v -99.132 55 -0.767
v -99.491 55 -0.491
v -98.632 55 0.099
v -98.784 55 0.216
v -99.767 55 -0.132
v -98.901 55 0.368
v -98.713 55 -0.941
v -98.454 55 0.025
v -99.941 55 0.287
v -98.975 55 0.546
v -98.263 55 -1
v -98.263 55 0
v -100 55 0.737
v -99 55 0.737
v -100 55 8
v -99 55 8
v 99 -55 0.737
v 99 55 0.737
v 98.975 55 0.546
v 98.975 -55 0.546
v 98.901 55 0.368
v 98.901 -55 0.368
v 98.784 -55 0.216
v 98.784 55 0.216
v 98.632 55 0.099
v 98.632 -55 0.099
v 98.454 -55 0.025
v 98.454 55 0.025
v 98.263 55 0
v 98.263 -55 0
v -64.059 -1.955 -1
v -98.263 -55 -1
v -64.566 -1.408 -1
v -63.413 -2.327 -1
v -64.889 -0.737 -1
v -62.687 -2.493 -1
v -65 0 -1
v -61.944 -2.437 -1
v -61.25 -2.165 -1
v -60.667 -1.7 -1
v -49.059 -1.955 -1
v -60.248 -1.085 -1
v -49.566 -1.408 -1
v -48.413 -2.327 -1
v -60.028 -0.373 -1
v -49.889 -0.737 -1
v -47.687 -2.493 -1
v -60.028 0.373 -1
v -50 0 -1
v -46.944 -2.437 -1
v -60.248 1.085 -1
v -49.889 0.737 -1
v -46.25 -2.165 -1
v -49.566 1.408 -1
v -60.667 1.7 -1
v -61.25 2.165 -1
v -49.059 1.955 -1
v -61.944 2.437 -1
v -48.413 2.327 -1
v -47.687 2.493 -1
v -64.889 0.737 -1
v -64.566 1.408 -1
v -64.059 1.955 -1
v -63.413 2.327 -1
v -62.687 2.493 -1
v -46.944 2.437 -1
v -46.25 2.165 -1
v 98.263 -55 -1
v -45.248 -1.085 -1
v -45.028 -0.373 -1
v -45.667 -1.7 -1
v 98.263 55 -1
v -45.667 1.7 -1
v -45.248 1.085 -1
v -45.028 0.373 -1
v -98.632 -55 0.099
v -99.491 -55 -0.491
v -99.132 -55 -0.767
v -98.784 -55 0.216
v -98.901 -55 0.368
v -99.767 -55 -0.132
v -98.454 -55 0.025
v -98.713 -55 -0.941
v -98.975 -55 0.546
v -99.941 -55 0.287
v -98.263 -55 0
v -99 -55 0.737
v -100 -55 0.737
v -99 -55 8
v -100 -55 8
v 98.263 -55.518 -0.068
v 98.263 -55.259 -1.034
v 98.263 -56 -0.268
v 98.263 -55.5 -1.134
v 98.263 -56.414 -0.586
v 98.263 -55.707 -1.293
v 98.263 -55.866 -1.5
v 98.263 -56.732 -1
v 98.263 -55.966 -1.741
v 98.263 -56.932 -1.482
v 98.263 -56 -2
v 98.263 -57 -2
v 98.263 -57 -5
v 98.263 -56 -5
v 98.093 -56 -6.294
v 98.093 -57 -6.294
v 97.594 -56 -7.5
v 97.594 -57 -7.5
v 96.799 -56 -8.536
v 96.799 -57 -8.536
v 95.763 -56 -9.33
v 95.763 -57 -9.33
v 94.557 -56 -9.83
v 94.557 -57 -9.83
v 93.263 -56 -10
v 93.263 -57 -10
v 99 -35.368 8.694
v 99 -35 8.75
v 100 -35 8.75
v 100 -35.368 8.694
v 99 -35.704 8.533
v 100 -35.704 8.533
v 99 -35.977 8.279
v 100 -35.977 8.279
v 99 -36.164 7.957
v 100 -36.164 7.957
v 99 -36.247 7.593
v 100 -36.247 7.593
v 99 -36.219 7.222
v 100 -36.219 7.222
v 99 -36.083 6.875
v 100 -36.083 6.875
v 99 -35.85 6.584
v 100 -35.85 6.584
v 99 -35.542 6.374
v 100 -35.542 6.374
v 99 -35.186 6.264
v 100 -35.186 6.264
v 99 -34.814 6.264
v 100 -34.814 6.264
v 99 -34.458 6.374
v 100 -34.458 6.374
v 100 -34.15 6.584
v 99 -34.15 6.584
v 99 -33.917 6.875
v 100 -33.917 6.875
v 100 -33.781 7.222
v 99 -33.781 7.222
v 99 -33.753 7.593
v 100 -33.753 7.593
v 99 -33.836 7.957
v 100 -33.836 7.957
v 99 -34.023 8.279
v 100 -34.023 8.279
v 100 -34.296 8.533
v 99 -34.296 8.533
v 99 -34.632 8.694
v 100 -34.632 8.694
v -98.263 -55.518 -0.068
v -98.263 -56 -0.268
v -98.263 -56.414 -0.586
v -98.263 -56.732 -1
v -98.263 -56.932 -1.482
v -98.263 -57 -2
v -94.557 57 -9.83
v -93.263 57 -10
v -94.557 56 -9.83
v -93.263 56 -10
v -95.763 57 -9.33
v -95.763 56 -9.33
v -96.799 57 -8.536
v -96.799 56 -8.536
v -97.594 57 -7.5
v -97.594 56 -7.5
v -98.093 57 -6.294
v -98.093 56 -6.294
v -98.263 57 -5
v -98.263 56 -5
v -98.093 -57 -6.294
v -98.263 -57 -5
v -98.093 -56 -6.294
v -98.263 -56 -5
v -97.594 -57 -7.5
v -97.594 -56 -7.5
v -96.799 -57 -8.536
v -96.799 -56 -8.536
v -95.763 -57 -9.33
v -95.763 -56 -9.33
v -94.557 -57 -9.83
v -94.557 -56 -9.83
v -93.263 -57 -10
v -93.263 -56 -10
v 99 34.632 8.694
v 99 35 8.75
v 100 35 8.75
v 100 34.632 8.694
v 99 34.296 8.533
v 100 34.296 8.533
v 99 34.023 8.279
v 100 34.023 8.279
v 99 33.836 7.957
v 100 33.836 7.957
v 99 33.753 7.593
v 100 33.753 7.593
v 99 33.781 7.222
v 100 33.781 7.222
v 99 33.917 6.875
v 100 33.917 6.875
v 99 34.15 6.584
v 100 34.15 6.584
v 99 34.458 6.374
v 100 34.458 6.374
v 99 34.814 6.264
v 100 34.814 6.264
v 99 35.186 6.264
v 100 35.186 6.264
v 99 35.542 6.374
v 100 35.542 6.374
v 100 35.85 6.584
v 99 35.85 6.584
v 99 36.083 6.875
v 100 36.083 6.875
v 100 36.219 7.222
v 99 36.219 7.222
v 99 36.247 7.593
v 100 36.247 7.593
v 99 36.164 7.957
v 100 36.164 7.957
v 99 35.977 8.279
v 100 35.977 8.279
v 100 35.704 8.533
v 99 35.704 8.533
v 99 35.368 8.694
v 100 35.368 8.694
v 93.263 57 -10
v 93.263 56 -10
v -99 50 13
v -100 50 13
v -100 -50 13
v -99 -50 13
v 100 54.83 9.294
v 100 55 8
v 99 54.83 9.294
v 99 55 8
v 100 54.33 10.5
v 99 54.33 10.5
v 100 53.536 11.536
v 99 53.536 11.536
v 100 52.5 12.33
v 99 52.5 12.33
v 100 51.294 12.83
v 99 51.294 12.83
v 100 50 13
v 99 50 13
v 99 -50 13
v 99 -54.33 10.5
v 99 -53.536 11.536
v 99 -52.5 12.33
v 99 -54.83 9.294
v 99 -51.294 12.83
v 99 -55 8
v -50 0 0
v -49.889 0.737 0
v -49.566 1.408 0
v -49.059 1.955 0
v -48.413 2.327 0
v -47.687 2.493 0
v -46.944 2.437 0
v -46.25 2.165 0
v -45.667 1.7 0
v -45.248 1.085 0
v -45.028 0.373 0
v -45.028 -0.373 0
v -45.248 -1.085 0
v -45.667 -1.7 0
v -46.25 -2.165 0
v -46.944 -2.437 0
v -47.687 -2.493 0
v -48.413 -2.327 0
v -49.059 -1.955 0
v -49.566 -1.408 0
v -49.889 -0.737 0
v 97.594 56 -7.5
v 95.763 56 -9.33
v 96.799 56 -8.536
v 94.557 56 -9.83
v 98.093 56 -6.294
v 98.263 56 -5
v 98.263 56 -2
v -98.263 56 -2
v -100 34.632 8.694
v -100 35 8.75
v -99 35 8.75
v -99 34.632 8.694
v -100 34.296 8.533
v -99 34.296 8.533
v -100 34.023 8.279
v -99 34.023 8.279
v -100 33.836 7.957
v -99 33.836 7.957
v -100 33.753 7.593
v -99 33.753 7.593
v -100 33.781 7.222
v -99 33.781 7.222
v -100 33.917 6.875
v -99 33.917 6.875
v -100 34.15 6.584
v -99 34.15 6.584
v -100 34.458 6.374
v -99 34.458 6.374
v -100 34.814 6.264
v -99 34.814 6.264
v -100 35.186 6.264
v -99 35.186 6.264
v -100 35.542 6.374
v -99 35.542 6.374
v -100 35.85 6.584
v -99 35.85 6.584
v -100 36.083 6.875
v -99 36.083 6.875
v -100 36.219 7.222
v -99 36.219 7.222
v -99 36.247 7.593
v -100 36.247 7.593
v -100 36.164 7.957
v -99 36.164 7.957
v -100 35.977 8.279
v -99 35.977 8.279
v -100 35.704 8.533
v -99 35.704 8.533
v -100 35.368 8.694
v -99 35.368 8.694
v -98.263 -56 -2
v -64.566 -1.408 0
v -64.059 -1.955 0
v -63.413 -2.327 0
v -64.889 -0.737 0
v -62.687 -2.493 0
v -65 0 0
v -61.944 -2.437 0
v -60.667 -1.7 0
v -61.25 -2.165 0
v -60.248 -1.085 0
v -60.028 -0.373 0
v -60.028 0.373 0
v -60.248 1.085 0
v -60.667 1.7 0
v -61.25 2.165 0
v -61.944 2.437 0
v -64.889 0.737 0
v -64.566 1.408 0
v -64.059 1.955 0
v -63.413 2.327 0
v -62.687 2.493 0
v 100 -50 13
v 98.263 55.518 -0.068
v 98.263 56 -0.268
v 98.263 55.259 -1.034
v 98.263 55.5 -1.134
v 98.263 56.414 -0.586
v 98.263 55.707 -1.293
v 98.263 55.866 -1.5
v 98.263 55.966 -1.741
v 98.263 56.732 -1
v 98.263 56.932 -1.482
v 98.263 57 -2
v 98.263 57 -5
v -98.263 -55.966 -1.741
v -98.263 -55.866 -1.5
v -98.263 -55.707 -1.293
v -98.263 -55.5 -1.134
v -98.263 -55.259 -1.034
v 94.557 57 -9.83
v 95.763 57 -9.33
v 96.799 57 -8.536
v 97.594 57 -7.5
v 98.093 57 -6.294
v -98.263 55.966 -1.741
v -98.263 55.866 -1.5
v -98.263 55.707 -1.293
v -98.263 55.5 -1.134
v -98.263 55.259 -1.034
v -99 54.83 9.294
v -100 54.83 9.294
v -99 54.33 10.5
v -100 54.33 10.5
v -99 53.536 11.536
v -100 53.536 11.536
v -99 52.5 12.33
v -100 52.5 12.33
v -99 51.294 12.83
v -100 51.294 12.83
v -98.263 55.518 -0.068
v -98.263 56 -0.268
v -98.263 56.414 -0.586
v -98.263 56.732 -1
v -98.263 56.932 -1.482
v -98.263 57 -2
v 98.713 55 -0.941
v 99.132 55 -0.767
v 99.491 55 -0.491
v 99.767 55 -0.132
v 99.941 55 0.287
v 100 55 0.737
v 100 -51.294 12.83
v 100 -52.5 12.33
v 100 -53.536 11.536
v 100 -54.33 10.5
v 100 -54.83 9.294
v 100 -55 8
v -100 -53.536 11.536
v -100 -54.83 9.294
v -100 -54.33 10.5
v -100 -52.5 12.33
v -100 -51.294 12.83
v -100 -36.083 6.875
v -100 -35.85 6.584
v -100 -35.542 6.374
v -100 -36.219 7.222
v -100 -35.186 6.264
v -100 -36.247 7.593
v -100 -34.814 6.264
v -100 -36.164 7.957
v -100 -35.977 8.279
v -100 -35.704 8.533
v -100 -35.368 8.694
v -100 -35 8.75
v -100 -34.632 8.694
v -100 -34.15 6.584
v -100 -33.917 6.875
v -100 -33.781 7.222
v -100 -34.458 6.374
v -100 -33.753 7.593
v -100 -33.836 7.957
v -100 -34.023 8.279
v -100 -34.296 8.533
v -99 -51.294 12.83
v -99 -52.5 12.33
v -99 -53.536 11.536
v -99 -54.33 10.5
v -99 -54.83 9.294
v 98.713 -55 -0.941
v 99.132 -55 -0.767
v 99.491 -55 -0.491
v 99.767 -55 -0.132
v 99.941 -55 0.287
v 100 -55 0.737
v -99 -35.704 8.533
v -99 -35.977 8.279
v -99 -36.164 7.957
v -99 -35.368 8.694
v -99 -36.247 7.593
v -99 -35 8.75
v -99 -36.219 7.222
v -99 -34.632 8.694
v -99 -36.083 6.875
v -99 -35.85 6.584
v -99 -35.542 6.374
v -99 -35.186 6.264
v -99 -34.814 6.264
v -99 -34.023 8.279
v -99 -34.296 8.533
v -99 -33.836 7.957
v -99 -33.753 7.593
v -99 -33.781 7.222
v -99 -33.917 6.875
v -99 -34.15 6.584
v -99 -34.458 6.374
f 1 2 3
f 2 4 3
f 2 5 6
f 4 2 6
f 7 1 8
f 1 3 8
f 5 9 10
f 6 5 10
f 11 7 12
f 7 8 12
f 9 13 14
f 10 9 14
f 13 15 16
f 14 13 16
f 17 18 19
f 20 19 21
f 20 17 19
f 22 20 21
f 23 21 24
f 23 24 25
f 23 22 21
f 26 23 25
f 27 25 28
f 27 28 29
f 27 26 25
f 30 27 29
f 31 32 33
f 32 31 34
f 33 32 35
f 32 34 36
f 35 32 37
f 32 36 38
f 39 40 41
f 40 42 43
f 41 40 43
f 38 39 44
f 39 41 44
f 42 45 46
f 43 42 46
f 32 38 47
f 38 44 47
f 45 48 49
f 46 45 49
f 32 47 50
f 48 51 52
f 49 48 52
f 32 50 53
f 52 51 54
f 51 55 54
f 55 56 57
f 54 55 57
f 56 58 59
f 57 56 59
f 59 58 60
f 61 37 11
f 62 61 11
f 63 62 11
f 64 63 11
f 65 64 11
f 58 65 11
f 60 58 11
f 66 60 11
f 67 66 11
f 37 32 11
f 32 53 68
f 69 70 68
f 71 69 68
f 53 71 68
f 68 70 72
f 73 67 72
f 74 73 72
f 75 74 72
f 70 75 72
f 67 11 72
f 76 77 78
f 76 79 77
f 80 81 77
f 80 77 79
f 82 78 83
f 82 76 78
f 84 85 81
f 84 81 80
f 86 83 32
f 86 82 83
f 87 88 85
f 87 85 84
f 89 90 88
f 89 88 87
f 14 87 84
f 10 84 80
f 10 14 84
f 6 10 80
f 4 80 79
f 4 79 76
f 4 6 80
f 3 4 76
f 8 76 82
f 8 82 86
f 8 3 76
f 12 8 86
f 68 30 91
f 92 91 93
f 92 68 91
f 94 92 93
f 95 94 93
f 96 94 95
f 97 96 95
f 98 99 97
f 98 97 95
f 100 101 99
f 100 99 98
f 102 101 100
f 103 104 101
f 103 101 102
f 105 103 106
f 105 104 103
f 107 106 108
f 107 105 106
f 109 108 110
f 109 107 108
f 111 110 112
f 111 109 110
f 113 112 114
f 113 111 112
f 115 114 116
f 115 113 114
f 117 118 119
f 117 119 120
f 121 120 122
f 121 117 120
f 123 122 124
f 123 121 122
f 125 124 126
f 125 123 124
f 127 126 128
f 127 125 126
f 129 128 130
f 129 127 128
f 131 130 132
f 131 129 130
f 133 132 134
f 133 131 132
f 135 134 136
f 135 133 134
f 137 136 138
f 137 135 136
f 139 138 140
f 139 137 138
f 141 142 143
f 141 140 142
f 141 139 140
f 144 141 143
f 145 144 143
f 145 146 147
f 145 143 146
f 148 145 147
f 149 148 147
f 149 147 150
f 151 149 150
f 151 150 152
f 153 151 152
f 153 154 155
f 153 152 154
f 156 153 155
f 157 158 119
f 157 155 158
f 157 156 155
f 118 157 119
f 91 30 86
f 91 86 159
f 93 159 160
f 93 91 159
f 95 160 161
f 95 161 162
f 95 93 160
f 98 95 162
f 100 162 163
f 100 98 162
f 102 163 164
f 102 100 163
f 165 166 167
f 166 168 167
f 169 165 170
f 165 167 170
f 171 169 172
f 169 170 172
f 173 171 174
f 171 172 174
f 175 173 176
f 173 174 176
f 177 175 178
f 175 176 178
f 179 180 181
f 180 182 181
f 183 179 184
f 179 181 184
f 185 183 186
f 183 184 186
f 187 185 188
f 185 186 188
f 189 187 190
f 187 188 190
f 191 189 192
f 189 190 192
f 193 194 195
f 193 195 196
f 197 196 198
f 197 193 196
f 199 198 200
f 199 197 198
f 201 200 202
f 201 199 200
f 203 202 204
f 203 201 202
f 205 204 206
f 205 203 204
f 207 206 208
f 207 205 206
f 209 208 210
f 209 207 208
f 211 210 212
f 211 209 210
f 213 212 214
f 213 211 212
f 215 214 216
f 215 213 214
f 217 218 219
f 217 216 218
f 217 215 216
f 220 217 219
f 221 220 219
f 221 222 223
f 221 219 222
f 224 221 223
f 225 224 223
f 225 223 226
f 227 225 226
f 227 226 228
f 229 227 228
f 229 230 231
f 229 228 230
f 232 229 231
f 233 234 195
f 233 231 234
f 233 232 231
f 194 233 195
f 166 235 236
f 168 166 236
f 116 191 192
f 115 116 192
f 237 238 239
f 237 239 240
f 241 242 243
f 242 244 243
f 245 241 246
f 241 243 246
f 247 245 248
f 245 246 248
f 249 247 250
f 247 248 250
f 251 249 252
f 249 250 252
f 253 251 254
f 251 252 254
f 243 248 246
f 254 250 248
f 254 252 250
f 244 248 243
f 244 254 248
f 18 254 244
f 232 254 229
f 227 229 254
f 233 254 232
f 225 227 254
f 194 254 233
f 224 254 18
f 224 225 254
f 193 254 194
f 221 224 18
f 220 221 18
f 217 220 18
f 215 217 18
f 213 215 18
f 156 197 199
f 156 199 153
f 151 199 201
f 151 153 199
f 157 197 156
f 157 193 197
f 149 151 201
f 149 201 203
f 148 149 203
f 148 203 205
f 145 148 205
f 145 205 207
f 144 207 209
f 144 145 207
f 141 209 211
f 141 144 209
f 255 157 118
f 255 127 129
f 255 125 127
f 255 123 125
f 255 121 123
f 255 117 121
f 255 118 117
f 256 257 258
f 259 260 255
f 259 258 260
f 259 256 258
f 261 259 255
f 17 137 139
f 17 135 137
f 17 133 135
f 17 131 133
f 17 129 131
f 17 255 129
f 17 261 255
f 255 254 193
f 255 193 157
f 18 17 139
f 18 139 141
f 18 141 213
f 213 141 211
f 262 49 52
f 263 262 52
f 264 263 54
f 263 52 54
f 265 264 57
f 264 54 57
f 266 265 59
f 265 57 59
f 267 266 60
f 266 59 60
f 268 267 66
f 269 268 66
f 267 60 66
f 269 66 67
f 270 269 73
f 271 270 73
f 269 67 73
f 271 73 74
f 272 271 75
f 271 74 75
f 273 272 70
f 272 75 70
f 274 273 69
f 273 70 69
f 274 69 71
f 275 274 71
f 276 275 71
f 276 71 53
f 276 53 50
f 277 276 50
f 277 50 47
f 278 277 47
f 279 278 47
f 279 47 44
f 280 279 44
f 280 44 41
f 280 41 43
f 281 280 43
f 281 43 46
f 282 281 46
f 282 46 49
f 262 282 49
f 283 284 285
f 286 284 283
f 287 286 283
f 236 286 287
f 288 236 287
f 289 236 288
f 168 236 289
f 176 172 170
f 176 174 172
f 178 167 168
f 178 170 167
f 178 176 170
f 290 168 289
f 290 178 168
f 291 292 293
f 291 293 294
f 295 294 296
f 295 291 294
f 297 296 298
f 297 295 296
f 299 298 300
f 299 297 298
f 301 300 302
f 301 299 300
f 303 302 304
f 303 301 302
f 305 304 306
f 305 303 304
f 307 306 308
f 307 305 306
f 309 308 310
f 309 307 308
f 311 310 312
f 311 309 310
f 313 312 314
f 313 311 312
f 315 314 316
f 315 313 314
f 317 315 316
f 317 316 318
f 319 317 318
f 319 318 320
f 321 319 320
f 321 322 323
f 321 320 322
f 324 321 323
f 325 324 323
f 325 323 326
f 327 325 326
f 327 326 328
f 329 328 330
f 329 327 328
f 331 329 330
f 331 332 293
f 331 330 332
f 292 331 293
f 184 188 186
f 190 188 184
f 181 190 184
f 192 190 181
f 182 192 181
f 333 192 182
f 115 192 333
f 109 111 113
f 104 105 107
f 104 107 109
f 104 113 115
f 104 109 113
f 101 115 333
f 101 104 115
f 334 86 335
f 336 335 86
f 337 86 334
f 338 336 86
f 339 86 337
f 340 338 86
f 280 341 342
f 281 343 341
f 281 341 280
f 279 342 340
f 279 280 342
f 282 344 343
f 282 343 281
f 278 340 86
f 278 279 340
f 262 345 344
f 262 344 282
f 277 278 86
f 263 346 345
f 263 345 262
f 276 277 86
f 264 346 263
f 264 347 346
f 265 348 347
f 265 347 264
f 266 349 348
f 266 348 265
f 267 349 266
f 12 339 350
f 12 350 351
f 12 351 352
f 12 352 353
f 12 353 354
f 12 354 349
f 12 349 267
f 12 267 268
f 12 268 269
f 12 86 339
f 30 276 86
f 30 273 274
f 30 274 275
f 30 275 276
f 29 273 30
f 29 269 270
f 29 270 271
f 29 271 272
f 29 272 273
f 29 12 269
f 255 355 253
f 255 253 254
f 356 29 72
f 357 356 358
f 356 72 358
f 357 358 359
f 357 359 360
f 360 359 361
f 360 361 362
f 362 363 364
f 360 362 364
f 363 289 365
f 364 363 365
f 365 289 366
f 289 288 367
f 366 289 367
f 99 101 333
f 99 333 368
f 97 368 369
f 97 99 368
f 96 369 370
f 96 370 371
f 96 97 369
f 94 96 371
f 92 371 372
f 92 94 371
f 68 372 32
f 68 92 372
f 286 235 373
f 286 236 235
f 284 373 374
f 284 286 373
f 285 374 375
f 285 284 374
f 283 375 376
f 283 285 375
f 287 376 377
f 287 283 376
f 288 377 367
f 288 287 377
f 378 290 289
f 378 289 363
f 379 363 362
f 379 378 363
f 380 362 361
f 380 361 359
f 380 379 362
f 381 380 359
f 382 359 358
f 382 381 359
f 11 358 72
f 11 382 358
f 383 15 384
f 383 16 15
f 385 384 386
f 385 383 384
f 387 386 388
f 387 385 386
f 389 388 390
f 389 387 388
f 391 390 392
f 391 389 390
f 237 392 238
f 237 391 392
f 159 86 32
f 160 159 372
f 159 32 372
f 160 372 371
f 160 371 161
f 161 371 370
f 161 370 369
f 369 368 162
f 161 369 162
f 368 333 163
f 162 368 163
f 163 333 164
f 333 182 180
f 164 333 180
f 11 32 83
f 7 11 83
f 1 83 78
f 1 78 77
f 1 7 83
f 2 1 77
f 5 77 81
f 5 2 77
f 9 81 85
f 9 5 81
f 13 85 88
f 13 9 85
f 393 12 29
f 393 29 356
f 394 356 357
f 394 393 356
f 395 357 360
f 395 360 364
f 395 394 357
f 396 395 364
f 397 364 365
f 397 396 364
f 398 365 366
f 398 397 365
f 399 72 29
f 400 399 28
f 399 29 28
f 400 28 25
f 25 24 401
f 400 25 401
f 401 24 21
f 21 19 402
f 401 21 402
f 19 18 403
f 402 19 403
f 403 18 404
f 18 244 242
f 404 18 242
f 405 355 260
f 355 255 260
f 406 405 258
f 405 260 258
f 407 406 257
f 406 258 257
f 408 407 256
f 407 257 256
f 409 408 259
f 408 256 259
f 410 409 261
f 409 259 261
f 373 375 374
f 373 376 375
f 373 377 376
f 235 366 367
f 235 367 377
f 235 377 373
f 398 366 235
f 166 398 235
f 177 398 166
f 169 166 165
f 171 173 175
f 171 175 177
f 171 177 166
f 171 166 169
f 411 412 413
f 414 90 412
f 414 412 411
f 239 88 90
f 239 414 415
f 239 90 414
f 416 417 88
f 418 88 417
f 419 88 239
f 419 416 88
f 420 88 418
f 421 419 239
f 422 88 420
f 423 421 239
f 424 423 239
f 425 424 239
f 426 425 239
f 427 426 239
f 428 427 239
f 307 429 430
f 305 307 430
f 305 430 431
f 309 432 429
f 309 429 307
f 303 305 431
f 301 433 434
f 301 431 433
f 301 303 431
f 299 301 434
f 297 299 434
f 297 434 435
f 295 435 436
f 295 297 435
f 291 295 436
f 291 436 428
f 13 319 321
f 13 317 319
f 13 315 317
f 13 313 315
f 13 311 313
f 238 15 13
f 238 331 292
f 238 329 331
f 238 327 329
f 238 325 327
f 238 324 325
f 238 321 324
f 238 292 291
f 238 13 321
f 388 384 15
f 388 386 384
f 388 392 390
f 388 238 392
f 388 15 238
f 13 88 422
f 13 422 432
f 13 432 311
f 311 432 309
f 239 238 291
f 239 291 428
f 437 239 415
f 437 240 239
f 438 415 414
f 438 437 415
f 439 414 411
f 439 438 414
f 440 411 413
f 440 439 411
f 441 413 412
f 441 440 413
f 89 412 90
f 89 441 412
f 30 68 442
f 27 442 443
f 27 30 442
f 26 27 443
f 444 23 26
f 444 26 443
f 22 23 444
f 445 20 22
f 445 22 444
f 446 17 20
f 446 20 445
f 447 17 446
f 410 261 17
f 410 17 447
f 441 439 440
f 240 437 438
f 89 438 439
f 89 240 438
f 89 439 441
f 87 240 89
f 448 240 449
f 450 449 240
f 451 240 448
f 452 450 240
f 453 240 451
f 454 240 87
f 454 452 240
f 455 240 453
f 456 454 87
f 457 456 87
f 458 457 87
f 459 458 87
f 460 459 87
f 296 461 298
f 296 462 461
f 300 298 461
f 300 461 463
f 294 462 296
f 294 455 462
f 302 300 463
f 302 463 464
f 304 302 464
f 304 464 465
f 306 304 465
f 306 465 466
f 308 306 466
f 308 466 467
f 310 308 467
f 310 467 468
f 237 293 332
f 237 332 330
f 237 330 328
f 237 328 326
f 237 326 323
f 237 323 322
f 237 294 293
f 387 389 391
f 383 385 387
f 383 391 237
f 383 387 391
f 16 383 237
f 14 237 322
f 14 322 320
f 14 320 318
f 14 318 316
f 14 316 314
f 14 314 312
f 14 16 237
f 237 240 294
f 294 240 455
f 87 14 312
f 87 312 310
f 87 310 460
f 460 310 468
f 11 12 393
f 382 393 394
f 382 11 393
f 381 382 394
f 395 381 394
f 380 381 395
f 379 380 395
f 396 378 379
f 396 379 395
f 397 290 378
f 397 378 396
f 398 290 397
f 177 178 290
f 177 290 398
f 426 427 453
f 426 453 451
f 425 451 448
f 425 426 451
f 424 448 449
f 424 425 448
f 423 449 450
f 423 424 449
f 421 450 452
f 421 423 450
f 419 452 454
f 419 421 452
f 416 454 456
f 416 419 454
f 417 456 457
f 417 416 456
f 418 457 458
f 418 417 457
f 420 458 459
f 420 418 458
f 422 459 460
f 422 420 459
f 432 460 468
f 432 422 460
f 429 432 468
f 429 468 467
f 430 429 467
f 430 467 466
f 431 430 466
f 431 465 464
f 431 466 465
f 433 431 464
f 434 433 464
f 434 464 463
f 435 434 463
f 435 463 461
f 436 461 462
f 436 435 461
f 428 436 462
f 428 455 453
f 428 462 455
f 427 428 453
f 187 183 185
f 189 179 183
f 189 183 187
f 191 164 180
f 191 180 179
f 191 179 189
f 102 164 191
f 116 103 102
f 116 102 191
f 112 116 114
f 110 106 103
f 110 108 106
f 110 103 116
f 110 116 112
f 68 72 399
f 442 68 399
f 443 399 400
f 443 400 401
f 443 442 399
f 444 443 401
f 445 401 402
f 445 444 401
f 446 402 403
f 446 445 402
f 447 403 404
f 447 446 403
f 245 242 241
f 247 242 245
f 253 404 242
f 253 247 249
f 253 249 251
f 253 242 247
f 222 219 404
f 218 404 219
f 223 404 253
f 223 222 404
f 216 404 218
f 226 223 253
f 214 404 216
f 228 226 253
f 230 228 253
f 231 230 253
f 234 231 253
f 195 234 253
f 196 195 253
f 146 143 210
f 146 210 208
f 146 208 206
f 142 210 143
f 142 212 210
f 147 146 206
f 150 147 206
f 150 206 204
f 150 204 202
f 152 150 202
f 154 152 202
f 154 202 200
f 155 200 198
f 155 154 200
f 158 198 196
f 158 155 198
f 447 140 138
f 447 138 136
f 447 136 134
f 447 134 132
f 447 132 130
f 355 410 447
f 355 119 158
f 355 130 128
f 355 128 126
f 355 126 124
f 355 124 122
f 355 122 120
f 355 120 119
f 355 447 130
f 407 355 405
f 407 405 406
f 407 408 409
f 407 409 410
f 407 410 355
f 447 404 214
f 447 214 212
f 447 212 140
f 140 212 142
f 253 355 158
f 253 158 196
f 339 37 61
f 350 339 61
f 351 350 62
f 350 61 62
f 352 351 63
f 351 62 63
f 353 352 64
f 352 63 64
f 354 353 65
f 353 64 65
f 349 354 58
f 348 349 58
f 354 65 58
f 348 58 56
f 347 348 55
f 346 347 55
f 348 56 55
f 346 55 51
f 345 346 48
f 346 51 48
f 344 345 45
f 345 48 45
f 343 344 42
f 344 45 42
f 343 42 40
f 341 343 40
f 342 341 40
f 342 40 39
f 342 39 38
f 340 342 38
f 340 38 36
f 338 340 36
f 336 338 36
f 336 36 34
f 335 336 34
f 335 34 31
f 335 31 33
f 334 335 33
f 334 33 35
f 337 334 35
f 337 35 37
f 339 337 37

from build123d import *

# Parameters (mm, degrees)
SKETCH1_W                    = 200
SKETCH1_H                    = 110
BASE_FLANGE1_DEPTH           = 1
EDGE_FLANGE1_STRIP_W         = 5.4732
EDGE_FLANGE1_STRIP_H         = 1
EDGE_FLANGE1_STRIP_CUT_DEPTH = 110
EDGE_FLANGE1_DEPTH           = 110
EDGE_FLANGE2_STRIP_W         = 5.4732
EDGE_FLANGE2_STRIP_H         = 1
EDGE_FLANGE2_STRIP_CUT_DEPTH = 110
EDGE_FLANGE2_DEPTH           = 110
CUT_EXTRUDE1_DEPTH           = 207.869524097
CUT_EXTRUDE1_DEPTH_BACK      = 10
SKETCH14_R                   = 1.25
EDGE_FLANGE3_DEPTH           = 196.5268
EDGE_FLANGE3_BEND_DEPTH      = 196.5268
FILLET1_R                    = 5
SKETCH20_R                   = 2.5
CUT_EXTRUDE2_DEPTH           = 116.952576513


# Sheet-metal steps are written as plain solids
with BuildPart() as part:
    # Sketch1 → Base-Flange1 (new body)
    with BuildSketch(Plane.XY):
        Rectangle(SKETCH1_W, SKETCH1_H)
    extrude(amount=-BASE_FLANGE1_DEPTH)

    # Edge-Flange1 strip (across the edge) → Edge-Flange1 strip cut (cut)
    with BuildSketch(Plane(origin=(-100, 55, 0), x_dir=(1, 0, 0), z_dir=(0, -1, 0))):
        with Locations((-1, -0.5)):
            Rectangle(EDGE_FLANGE1_STRIP_W, EDGE_FLANGE1_STRIP_H)
    extrude(amount=EDGE_FLANGE1_STRIP_CUT_DEPTH, mode=Mode.SUBTRACT)

    # Edge-Flange1 section (across the edge) → Edge-Flange1 (add)
    with BuildSketch(Plane(origin=(-100, 55, 0), x_dir=(1, 0, 0), z_dir=(0, -1, 0))):
        with BuildLine():
            Line((0, 0.7366), (0, 13))
            Line((0, 13), (1, 13))
            Line((1, 13), (1, 0.7366))
            ThreePointArc((1, 0.7366), (1.215745145, 0.215745145), (1.7366, 0))
            Line((1.7366, 0), (1.7366, -1))
            ThreePointArc((1.7366, -1), (0.508638364, -0.491361636), (0, 0.7366))
        make_face()
    extrude(amount=EDGE_FLANGE1_DEPTH)

    # Edge-Flange2 strip (across the edge) → Edge-Flange2 strip cut (cut)
    with BuildSketch(Plane(origin=(100, -55, 0), x_dir=(-1, 0, 0), z_dir=(0, 1, 0))):
        with Locations((-1, -0.5)):
            Rectangle(EDGE_FLANGE2_STRIP_W, EDGE_FLANGE2_STRIP_H)
    extrude(amount=EDGE_FLANGE2_STRIP_CUT_DEPTH, mode=Mode.SUBTRACT)

    # Edge-Flange2 section (across the edge) → Edge-Flange2 (add)
    with BuildSketch(Plane(origin=(100, -55, 0), x_dir=(-1, 0, 0), z_dir=(0, 1, 0))):
        with BuildLine():
            Line((0, 0.7366), (0, 13))
            Line((0, 13), (1, 13))
            Line((1, 13), (1, 0.7366))
            ThreePointArc((1, 0.7366), (1.215745145, 0.215745145), (1.7366, 0))
            Line((1.7366, 0), (1.7366, -1))
            ThreePointArc((1.7366, -1), (0.508638364, -0.491361636), (0, 0.7366))
        make_face()
    extrude(amount=EDGE_FLANGE2_DEPTH)

    # Sketch14 → Cut-Extrude1 (cut, two sides: drawn at the far end of the back side and taken through both)
    with BuildSketch(Plane(origin=(-99, 0, 0), x_dir=(0, 0, -1), z_dir=(1, 0, 0)).offset(-CUT_EXTRUDE1_DEPTH_BACK)):
        with Locations(Location((-7.5, -35, 0), (0, 0, 180))):
            Circle(SKETCH14_R)
        with Locations(Location((-7.5, 35, 0), (0, 0, 180))):
            Circle(SKETCH14_R)
    extrude(amount=CUT_EXTRUDE1_DEPTH + CUT_EXTRUDE1_DEPTH_BACK, mode=Mode.SUBTRACT)

    # Edge-Flange3 section (across the edge) → Edge-Flange3 (add)
    with BuildSketch(Plane(origin=(98.2634, -56, -1), x_dir=(0, 1, 0), z_dir=(-1, 0, 0))):
        with BuildLine():
            Line((-1, 1), (-1, 9))
            Line((-1, 9), (0, 9))
            Line((0, 9), (0, 1))
            ThreePointArc((0, 1), (0.292893219, 0.292893219), (1, 0))
            Line((1, 0), (1, -1))
            ThreePointArc((1, -1), (-0.414213562, -0.414213562), (-1, 1))
        make_face()
    extrude(amount=EDGE_FLANGE3_DEPTH)

    # Edge-Flange3 section 2 (across the edge) → Edge-Flange3 bend (add)
    with BuildSketch(Plane(origin=(-98.2634, 56, -1), x_dir=(0, -1, 0), z_dir=(1, 0, 0))):
        with BuildLine():
            Line((-1, 1), (-1, 9))
            Line((-1, 9), (0, 9))
            Line((0, 9), (0, 1))
            ThreePointArc((0, 1), (0.292893219, 0.292893219), (1, 0))
            Line((1, 0), (1, -1))
            ThreePointArc((1, -1), (-0.414213562, -0.414213562), (-1, 1))
        make_face()
    extrude(amount=EDGE_FLANGE3_BEND_DEPTH)

    # Fillet1
    fillet1_edges = [part.edges().sort_by_distance(p)[0] for p in [
        (98.2634, -56.5, -10),
        (-98.2634, -56.5, -10),
        (-98.2634, 56.5, -10),
        (98.2634, 56.5, -10),
        (-99.5, 55, 13),
        (-99.5, -55, 13),
        (99.5, -55, 13),
        (99.5, 55, 13),
    ]]
    fillet(fillet1_edges, radius=FILLET1_R)

    # Sketch20 → Cut-Extrude2 (cut, through all)
    with BuildSketch(Plane(origin=(0, 0, -1), x_dir=(-1, 0, 0), z_dir=(0, 0, -1))):
        with Locations((47.5, 0)):
            Circle(SKETCH20_R)
        with Locations((62.5, 0)):
            Circle(SKETCH20_R)
    extrude(amount=-CUT_EXTRUDE2_DEPTH, mode=Mode.SUBTRACT)


solid = part.part
